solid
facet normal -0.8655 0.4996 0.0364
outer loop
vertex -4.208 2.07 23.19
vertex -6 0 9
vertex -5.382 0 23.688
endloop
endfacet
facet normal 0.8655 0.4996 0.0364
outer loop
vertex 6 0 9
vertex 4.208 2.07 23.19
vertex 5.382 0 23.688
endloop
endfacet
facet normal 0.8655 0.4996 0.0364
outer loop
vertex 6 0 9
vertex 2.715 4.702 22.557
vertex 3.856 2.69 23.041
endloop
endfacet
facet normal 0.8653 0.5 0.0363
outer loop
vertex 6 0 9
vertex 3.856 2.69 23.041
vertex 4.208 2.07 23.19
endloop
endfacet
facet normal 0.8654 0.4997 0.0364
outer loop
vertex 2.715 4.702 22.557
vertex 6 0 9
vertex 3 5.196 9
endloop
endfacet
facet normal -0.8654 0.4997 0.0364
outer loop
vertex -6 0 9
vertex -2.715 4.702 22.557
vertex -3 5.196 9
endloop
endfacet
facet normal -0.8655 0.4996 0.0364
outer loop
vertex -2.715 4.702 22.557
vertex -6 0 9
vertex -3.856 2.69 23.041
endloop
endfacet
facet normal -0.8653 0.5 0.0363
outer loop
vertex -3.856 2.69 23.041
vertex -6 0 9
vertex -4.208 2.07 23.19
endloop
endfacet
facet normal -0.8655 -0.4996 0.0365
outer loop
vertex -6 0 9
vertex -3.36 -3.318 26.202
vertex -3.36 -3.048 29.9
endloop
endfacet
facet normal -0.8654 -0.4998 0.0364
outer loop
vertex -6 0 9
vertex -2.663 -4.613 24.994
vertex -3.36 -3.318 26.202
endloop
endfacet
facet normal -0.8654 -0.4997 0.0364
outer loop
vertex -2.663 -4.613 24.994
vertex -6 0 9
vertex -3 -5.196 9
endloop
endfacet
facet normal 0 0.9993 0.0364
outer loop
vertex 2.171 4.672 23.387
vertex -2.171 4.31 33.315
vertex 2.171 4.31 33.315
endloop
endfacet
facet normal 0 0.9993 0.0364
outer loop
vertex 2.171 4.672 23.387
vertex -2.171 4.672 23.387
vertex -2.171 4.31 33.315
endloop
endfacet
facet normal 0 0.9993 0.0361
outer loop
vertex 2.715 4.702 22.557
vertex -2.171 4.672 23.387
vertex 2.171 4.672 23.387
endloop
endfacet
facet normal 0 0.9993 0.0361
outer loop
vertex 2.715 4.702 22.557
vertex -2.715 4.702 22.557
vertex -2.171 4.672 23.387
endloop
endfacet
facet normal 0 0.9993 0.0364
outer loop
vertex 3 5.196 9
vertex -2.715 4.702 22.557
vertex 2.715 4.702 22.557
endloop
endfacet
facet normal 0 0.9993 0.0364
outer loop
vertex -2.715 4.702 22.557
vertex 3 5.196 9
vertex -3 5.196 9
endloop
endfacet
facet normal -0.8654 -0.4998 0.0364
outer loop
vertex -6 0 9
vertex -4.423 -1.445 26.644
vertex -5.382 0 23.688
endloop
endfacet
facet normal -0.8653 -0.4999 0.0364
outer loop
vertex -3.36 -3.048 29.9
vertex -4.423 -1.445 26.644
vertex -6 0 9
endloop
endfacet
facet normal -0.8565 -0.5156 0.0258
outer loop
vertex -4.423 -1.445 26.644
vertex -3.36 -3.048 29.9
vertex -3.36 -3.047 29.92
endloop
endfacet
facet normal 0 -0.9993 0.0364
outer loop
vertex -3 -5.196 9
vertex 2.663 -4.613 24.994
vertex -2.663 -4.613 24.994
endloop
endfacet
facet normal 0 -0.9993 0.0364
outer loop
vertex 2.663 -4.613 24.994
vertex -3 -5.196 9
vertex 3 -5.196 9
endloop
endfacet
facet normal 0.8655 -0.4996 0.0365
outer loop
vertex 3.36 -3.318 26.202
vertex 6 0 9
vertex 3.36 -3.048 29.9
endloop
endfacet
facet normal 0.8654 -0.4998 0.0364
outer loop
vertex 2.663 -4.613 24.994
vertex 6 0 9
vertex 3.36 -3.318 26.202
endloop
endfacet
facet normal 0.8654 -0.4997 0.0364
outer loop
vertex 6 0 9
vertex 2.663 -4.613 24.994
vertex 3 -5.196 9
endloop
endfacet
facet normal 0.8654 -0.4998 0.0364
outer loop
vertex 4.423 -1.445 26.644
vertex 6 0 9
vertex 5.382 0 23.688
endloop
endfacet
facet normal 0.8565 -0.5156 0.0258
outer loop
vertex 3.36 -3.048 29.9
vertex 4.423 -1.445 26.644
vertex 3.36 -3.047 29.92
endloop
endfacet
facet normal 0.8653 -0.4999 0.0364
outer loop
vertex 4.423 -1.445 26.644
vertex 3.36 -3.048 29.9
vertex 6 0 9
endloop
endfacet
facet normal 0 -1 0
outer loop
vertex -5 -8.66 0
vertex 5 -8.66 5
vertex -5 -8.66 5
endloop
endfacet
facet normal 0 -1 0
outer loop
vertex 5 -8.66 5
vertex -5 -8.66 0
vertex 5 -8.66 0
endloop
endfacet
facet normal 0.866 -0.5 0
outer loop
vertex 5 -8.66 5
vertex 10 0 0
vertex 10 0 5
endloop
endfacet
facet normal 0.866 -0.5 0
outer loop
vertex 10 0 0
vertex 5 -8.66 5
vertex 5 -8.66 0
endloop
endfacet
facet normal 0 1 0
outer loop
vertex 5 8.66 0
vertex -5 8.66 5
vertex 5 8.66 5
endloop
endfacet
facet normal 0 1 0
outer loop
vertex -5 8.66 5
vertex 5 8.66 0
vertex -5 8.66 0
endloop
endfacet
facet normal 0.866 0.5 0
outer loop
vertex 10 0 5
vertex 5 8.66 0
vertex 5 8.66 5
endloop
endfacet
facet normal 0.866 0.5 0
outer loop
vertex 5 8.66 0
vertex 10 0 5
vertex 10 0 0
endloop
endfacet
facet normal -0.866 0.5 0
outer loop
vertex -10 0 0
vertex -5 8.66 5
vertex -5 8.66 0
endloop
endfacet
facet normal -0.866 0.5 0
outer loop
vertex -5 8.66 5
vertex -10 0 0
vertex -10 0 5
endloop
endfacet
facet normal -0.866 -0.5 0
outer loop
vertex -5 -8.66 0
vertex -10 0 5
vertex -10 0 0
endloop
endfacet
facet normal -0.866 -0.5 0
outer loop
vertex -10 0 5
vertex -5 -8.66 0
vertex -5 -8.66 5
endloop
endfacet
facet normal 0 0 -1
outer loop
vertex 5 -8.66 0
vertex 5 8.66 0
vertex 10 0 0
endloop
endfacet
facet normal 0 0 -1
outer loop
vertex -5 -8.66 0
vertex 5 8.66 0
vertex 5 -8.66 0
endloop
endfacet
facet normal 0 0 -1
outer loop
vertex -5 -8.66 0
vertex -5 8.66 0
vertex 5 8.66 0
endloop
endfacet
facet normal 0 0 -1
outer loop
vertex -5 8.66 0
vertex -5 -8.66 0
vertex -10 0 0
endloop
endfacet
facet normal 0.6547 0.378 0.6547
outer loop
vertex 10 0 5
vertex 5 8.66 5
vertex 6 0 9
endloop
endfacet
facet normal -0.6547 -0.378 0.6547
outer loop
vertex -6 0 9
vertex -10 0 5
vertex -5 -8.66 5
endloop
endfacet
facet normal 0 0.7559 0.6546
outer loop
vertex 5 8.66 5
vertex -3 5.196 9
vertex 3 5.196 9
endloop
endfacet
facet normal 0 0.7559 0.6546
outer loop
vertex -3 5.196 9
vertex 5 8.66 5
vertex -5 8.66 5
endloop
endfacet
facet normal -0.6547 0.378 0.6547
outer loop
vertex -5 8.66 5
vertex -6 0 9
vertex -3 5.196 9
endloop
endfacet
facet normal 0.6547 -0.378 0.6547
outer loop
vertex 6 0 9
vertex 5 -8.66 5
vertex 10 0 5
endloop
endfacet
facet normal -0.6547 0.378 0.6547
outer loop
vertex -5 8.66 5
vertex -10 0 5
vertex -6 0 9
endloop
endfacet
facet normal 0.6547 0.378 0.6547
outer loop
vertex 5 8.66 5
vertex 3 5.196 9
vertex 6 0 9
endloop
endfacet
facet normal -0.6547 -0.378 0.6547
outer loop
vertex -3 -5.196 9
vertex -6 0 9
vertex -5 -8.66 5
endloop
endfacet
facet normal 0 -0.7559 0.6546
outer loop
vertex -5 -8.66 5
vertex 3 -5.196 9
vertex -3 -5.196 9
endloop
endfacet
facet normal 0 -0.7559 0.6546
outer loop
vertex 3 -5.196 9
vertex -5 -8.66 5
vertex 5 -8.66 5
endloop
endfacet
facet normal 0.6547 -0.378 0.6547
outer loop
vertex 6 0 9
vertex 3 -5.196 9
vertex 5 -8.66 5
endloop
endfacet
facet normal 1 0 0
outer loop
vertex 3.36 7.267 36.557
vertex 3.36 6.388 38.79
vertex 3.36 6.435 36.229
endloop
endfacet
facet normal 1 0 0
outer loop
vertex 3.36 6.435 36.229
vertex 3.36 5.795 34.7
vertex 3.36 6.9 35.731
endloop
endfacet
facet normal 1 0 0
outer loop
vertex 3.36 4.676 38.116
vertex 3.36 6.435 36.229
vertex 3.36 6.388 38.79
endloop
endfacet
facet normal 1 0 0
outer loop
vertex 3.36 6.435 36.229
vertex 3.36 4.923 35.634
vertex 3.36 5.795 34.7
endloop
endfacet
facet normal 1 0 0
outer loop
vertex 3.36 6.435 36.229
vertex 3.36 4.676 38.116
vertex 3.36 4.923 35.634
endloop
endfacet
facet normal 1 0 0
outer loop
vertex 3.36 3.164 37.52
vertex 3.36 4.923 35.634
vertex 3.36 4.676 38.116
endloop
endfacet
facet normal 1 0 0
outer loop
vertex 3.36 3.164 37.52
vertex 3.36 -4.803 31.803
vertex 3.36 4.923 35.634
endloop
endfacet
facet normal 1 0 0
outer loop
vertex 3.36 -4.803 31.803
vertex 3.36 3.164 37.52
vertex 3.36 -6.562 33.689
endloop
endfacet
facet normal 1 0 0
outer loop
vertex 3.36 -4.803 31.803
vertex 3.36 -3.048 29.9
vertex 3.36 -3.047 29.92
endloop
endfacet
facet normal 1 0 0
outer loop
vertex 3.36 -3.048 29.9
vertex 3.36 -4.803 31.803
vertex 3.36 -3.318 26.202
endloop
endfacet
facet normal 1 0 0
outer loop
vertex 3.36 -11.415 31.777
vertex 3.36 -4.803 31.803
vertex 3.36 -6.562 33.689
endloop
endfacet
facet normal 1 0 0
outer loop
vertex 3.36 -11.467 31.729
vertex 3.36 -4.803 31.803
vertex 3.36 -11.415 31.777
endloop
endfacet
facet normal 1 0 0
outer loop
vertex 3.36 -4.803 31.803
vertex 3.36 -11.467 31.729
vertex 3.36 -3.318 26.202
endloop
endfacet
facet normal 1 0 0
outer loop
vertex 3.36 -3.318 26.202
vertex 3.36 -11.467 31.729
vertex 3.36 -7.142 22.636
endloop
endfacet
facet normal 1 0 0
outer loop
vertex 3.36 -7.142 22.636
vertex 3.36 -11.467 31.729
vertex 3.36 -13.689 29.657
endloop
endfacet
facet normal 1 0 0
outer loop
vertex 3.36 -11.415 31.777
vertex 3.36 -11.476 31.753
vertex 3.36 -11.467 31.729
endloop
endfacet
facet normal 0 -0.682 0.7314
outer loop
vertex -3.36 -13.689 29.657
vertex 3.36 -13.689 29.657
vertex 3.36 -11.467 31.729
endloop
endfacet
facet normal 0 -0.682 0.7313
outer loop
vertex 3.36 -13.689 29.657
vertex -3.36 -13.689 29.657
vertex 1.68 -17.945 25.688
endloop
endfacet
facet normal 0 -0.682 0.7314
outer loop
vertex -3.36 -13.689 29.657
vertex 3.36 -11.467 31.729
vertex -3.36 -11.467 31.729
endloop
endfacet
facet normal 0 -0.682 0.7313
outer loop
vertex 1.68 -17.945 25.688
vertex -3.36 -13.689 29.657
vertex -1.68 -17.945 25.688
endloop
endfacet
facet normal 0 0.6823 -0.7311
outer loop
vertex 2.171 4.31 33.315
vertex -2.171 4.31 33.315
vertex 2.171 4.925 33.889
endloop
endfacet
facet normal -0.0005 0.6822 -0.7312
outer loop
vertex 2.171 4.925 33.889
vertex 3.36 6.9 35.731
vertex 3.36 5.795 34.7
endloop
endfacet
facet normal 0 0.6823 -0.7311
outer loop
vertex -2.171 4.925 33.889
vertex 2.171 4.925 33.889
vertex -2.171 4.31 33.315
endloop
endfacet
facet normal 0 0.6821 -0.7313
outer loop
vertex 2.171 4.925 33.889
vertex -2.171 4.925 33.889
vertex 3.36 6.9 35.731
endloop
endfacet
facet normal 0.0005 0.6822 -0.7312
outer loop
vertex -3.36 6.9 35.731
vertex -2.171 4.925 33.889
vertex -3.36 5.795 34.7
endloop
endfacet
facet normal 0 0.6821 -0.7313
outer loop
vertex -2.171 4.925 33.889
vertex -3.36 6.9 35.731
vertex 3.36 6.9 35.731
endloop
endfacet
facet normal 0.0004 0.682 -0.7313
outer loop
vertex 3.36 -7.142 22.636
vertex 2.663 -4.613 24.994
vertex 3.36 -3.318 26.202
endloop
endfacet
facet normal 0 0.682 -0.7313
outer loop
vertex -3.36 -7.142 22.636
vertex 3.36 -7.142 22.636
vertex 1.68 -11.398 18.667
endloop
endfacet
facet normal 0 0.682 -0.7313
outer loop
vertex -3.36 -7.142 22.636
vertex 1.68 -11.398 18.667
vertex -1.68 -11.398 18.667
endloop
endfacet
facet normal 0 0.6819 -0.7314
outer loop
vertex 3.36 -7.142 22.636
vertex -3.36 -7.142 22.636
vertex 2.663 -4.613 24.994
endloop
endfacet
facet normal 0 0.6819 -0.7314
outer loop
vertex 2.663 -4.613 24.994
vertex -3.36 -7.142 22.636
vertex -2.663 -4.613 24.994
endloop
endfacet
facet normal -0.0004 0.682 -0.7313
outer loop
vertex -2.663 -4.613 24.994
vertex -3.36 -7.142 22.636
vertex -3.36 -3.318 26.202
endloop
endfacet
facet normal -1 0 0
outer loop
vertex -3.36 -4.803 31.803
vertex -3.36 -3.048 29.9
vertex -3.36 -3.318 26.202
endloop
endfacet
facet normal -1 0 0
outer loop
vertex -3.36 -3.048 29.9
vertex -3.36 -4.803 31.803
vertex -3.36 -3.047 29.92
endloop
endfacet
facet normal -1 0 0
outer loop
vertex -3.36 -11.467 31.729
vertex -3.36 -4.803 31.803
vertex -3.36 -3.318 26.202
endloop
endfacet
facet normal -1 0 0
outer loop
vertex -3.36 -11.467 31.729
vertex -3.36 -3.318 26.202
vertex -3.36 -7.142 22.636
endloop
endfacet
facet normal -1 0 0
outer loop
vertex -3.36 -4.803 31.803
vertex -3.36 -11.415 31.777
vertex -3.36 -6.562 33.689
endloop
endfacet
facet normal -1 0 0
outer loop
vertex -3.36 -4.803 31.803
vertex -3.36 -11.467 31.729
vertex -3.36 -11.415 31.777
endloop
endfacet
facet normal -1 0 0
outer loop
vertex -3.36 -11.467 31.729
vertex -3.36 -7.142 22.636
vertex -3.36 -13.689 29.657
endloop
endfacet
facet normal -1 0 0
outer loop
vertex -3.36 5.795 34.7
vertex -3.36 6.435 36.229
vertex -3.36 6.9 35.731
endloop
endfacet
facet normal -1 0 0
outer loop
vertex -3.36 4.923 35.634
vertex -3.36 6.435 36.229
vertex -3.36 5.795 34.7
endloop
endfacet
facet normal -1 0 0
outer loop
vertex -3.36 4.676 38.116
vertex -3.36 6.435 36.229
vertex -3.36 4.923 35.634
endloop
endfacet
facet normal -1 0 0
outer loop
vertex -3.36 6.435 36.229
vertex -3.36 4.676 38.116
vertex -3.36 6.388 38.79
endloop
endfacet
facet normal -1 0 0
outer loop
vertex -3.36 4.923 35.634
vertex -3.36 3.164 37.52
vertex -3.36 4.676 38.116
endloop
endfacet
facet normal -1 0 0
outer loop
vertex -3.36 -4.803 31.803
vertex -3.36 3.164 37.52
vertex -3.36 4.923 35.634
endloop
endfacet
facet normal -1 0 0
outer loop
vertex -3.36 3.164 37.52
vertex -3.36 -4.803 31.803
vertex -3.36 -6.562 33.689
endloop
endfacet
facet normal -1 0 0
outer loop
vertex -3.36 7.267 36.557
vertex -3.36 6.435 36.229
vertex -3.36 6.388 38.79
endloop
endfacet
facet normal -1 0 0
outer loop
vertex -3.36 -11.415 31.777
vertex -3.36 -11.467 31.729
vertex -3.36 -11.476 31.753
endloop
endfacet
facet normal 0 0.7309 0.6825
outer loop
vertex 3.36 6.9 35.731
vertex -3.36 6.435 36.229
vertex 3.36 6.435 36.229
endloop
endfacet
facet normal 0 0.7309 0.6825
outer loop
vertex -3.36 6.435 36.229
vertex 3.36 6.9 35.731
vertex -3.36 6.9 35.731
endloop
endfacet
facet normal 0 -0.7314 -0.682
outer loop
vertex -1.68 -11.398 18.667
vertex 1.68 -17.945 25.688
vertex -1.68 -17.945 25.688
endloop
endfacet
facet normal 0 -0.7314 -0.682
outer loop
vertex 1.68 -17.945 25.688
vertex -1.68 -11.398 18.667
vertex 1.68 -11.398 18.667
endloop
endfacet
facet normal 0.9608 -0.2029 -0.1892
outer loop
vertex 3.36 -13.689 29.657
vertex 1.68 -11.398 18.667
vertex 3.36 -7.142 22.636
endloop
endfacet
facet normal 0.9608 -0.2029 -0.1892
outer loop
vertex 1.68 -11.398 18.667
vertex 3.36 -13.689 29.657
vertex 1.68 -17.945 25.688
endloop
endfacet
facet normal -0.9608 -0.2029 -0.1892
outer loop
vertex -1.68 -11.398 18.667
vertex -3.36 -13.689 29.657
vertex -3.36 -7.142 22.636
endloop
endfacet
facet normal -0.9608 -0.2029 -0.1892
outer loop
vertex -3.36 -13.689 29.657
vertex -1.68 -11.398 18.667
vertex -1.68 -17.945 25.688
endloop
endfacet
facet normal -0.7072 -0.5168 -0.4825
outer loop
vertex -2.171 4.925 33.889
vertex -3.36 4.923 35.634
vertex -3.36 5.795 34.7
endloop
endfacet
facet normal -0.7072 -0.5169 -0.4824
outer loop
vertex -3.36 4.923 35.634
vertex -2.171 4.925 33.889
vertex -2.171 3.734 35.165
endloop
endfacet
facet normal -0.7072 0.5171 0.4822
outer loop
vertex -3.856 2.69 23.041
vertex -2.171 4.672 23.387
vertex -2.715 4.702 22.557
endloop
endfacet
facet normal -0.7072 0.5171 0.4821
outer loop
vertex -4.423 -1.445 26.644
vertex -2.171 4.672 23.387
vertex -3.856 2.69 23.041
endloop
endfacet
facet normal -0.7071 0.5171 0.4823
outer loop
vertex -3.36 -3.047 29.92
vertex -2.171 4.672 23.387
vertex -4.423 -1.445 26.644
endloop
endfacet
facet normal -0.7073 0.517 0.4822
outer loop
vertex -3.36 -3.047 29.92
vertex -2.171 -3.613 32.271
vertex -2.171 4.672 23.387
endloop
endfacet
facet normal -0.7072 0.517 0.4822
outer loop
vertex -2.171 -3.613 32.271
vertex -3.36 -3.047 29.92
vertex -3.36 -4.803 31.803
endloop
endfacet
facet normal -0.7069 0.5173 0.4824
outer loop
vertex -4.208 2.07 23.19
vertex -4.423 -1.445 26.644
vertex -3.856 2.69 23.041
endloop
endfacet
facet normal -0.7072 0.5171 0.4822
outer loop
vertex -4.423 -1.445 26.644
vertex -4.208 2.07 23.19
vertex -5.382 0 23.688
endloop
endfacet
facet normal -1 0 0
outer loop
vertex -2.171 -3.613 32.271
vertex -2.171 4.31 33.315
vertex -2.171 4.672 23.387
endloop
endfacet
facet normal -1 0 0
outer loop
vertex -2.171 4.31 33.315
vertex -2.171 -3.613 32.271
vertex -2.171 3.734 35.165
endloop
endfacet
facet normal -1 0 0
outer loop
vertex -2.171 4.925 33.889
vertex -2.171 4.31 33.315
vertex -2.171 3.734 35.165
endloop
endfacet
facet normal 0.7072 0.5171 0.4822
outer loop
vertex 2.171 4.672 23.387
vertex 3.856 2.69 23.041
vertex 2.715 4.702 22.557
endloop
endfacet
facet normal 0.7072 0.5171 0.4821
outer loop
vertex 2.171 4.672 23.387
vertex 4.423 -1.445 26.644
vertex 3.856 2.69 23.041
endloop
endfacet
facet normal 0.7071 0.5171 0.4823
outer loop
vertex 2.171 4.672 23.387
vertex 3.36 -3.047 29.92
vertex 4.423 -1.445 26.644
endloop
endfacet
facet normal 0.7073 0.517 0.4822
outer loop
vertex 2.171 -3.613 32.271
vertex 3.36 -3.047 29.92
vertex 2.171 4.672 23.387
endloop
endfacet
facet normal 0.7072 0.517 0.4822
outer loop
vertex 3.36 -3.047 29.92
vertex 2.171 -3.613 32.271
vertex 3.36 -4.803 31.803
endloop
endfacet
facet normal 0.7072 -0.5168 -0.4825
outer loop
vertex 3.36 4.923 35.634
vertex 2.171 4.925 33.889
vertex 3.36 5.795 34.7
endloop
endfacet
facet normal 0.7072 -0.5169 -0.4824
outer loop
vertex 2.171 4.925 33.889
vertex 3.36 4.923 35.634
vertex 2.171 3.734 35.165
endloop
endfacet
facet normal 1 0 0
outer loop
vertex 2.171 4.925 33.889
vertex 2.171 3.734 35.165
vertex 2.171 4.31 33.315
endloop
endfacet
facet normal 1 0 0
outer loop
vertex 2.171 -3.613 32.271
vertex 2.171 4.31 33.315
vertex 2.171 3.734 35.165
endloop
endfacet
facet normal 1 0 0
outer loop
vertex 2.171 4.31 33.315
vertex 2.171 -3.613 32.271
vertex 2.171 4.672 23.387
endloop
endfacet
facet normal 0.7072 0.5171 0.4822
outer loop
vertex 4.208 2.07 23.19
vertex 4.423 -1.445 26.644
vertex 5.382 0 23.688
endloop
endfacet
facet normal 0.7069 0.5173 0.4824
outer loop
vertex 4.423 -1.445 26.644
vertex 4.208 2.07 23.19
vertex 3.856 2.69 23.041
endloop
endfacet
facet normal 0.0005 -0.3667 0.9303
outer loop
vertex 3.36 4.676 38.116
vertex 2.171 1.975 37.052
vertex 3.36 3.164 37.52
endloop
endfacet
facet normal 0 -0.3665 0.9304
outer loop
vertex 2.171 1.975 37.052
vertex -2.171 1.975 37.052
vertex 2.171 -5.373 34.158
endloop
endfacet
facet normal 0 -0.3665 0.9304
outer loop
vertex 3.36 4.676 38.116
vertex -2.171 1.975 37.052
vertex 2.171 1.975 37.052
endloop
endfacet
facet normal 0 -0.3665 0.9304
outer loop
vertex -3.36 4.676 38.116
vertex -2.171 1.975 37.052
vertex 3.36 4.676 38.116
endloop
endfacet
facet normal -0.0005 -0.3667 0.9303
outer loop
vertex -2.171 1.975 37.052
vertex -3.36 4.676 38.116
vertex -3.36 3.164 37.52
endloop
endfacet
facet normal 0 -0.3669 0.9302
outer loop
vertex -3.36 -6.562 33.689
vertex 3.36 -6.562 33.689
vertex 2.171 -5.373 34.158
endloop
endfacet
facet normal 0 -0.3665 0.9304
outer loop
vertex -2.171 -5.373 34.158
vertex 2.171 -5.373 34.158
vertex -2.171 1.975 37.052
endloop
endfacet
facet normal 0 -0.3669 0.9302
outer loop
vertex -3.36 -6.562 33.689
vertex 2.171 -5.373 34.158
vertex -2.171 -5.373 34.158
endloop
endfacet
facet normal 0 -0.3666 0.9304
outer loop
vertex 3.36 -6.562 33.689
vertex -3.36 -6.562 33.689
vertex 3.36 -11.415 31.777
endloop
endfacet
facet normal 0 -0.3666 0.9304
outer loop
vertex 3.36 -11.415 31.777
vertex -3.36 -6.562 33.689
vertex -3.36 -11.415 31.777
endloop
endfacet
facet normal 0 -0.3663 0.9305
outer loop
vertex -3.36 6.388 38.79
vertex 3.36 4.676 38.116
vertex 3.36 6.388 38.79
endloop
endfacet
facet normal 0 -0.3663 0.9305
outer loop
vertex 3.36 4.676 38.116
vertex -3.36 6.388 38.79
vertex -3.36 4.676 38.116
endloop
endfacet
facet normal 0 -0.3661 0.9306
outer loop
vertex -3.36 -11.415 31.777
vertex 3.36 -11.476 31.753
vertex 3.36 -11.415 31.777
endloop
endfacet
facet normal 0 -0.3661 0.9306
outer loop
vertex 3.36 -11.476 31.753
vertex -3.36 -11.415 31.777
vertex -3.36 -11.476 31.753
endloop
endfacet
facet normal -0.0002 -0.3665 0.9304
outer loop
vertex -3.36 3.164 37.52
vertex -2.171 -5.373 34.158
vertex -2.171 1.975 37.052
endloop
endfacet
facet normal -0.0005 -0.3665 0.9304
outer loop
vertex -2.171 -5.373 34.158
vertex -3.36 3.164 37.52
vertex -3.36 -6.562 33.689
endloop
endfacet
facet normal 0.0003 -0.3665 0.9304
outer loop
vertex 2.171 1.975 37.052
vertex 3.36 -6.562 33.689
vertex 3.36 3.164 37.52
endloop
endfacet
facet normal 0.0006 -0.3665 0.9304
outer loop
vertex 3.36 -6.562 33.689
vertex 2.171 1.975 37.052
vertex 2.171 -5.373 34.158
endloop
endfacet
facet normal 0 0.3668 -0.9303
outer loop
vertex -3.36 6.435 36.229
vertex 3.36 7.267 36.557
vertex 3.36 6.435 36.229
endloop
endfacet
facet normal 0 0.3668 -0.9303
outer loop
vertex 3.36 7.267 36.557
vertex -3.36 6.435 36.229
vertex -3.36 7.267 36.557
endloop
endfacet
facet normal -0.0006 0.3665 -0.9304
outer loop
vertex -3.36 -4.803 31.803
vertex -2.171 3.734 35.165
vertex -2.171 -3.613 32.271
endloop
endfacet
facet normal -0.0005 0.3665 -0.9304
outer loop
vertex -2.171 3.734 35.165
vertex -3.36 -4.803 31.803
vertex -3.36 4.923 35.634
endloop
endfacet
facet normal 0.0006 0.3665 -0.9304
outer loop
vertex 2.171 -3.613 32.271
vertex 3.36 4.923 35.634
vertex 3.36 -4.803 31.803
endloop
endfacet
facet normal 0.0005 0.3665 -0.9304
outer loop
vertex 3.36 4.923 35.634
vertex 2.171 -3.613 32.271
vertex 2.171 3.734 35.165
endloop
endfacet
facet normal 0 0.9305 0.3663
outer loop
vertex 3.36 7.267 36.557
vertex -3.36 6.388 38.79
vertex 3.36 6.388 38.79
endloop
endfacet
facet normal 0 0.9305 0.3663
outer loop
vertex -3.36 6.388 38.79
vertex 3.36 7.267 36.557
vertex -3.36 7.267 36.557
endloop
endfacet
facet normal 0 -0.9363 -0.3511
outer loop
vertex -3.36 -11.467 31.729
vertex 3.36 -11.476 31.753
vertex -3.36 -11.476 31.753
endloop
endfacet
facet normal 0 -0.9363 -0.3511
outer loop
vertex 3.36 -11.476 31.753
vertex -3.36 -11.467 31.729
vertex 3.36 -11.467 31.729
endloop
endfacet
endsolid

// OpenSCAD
// file: piece_base.scad
include <config.scad>;

module piece_base(height,top_diam){
	union(){
		translate([0,0,base_height+(base_diam-piece_diam)/2])
		cylinder(r1=piece_diam/2,r2=top_diam/2,h=height-base_height-(base_diam-piece_diam)/2);
		cylinder(r=base_diam/2,h=base_height);
		translate([0,0,base_height])
			cylinder(r1=base_diam/2,
						r2=piece_diam/2,
						h=(base_diam-piece_diam)/2);
	}
}

piece_base(pawn_height,piece_diam*0.6);
// file: config.scad
piece_diam = 12;
base_diam = 20;
base_height = 5;
pawn_height = 25;


$fn=6;
// main file
include <config.scad>;
use <piece_base.scad>;

knight_height = pawn_height*1.5;
head_width = piece_diam*0.8;
head_rotate = 43;

module knight(){
	union(){
		difference(){
			union(){
				piece_base(knight_height,piece_diam*0.8);
				translate([0,0,knight_height]){
					cylinder(r1 = piece_diam*0.8/2,
						r2 = 0,
						h = piece_diam*0.4);
					rotate([head_rotate,0,0])
					translate([0,-head_width*0.6,-head_width/8])
					union(){
					cube([head_width*0.7,head_width*2,head_width],center=true);
					translate([0,-head_width,0])
					scale([1,2,1])
						cylinder(r=head_width*0.7/2,h=head_width,center=true);
					}
				}
			}
			for(i=[-1,1]){
					rotate([head_rotate,0,0])
					translate([i*(head_width*0.7/2+head_width*0.8),head_width*3,0])
					translate([0,-head_width*0.6,-head_width/8])
					rotate([0,0,22.5])
					cylinder(r=head_width,h=50,$fn=8);
			}
			rotate([head_rotate/2,0,0])
			translate([0,0,knight_height*1.4])
			cube(knight_height,center=true);
		}
		rotate([head_rotate/2,0,0])
		translate([0,head_width*1.1,knight_height*0.868])
		cube([head_width*0.7,head_width*2,head_width/4],center=true);
	}
}
knight();
